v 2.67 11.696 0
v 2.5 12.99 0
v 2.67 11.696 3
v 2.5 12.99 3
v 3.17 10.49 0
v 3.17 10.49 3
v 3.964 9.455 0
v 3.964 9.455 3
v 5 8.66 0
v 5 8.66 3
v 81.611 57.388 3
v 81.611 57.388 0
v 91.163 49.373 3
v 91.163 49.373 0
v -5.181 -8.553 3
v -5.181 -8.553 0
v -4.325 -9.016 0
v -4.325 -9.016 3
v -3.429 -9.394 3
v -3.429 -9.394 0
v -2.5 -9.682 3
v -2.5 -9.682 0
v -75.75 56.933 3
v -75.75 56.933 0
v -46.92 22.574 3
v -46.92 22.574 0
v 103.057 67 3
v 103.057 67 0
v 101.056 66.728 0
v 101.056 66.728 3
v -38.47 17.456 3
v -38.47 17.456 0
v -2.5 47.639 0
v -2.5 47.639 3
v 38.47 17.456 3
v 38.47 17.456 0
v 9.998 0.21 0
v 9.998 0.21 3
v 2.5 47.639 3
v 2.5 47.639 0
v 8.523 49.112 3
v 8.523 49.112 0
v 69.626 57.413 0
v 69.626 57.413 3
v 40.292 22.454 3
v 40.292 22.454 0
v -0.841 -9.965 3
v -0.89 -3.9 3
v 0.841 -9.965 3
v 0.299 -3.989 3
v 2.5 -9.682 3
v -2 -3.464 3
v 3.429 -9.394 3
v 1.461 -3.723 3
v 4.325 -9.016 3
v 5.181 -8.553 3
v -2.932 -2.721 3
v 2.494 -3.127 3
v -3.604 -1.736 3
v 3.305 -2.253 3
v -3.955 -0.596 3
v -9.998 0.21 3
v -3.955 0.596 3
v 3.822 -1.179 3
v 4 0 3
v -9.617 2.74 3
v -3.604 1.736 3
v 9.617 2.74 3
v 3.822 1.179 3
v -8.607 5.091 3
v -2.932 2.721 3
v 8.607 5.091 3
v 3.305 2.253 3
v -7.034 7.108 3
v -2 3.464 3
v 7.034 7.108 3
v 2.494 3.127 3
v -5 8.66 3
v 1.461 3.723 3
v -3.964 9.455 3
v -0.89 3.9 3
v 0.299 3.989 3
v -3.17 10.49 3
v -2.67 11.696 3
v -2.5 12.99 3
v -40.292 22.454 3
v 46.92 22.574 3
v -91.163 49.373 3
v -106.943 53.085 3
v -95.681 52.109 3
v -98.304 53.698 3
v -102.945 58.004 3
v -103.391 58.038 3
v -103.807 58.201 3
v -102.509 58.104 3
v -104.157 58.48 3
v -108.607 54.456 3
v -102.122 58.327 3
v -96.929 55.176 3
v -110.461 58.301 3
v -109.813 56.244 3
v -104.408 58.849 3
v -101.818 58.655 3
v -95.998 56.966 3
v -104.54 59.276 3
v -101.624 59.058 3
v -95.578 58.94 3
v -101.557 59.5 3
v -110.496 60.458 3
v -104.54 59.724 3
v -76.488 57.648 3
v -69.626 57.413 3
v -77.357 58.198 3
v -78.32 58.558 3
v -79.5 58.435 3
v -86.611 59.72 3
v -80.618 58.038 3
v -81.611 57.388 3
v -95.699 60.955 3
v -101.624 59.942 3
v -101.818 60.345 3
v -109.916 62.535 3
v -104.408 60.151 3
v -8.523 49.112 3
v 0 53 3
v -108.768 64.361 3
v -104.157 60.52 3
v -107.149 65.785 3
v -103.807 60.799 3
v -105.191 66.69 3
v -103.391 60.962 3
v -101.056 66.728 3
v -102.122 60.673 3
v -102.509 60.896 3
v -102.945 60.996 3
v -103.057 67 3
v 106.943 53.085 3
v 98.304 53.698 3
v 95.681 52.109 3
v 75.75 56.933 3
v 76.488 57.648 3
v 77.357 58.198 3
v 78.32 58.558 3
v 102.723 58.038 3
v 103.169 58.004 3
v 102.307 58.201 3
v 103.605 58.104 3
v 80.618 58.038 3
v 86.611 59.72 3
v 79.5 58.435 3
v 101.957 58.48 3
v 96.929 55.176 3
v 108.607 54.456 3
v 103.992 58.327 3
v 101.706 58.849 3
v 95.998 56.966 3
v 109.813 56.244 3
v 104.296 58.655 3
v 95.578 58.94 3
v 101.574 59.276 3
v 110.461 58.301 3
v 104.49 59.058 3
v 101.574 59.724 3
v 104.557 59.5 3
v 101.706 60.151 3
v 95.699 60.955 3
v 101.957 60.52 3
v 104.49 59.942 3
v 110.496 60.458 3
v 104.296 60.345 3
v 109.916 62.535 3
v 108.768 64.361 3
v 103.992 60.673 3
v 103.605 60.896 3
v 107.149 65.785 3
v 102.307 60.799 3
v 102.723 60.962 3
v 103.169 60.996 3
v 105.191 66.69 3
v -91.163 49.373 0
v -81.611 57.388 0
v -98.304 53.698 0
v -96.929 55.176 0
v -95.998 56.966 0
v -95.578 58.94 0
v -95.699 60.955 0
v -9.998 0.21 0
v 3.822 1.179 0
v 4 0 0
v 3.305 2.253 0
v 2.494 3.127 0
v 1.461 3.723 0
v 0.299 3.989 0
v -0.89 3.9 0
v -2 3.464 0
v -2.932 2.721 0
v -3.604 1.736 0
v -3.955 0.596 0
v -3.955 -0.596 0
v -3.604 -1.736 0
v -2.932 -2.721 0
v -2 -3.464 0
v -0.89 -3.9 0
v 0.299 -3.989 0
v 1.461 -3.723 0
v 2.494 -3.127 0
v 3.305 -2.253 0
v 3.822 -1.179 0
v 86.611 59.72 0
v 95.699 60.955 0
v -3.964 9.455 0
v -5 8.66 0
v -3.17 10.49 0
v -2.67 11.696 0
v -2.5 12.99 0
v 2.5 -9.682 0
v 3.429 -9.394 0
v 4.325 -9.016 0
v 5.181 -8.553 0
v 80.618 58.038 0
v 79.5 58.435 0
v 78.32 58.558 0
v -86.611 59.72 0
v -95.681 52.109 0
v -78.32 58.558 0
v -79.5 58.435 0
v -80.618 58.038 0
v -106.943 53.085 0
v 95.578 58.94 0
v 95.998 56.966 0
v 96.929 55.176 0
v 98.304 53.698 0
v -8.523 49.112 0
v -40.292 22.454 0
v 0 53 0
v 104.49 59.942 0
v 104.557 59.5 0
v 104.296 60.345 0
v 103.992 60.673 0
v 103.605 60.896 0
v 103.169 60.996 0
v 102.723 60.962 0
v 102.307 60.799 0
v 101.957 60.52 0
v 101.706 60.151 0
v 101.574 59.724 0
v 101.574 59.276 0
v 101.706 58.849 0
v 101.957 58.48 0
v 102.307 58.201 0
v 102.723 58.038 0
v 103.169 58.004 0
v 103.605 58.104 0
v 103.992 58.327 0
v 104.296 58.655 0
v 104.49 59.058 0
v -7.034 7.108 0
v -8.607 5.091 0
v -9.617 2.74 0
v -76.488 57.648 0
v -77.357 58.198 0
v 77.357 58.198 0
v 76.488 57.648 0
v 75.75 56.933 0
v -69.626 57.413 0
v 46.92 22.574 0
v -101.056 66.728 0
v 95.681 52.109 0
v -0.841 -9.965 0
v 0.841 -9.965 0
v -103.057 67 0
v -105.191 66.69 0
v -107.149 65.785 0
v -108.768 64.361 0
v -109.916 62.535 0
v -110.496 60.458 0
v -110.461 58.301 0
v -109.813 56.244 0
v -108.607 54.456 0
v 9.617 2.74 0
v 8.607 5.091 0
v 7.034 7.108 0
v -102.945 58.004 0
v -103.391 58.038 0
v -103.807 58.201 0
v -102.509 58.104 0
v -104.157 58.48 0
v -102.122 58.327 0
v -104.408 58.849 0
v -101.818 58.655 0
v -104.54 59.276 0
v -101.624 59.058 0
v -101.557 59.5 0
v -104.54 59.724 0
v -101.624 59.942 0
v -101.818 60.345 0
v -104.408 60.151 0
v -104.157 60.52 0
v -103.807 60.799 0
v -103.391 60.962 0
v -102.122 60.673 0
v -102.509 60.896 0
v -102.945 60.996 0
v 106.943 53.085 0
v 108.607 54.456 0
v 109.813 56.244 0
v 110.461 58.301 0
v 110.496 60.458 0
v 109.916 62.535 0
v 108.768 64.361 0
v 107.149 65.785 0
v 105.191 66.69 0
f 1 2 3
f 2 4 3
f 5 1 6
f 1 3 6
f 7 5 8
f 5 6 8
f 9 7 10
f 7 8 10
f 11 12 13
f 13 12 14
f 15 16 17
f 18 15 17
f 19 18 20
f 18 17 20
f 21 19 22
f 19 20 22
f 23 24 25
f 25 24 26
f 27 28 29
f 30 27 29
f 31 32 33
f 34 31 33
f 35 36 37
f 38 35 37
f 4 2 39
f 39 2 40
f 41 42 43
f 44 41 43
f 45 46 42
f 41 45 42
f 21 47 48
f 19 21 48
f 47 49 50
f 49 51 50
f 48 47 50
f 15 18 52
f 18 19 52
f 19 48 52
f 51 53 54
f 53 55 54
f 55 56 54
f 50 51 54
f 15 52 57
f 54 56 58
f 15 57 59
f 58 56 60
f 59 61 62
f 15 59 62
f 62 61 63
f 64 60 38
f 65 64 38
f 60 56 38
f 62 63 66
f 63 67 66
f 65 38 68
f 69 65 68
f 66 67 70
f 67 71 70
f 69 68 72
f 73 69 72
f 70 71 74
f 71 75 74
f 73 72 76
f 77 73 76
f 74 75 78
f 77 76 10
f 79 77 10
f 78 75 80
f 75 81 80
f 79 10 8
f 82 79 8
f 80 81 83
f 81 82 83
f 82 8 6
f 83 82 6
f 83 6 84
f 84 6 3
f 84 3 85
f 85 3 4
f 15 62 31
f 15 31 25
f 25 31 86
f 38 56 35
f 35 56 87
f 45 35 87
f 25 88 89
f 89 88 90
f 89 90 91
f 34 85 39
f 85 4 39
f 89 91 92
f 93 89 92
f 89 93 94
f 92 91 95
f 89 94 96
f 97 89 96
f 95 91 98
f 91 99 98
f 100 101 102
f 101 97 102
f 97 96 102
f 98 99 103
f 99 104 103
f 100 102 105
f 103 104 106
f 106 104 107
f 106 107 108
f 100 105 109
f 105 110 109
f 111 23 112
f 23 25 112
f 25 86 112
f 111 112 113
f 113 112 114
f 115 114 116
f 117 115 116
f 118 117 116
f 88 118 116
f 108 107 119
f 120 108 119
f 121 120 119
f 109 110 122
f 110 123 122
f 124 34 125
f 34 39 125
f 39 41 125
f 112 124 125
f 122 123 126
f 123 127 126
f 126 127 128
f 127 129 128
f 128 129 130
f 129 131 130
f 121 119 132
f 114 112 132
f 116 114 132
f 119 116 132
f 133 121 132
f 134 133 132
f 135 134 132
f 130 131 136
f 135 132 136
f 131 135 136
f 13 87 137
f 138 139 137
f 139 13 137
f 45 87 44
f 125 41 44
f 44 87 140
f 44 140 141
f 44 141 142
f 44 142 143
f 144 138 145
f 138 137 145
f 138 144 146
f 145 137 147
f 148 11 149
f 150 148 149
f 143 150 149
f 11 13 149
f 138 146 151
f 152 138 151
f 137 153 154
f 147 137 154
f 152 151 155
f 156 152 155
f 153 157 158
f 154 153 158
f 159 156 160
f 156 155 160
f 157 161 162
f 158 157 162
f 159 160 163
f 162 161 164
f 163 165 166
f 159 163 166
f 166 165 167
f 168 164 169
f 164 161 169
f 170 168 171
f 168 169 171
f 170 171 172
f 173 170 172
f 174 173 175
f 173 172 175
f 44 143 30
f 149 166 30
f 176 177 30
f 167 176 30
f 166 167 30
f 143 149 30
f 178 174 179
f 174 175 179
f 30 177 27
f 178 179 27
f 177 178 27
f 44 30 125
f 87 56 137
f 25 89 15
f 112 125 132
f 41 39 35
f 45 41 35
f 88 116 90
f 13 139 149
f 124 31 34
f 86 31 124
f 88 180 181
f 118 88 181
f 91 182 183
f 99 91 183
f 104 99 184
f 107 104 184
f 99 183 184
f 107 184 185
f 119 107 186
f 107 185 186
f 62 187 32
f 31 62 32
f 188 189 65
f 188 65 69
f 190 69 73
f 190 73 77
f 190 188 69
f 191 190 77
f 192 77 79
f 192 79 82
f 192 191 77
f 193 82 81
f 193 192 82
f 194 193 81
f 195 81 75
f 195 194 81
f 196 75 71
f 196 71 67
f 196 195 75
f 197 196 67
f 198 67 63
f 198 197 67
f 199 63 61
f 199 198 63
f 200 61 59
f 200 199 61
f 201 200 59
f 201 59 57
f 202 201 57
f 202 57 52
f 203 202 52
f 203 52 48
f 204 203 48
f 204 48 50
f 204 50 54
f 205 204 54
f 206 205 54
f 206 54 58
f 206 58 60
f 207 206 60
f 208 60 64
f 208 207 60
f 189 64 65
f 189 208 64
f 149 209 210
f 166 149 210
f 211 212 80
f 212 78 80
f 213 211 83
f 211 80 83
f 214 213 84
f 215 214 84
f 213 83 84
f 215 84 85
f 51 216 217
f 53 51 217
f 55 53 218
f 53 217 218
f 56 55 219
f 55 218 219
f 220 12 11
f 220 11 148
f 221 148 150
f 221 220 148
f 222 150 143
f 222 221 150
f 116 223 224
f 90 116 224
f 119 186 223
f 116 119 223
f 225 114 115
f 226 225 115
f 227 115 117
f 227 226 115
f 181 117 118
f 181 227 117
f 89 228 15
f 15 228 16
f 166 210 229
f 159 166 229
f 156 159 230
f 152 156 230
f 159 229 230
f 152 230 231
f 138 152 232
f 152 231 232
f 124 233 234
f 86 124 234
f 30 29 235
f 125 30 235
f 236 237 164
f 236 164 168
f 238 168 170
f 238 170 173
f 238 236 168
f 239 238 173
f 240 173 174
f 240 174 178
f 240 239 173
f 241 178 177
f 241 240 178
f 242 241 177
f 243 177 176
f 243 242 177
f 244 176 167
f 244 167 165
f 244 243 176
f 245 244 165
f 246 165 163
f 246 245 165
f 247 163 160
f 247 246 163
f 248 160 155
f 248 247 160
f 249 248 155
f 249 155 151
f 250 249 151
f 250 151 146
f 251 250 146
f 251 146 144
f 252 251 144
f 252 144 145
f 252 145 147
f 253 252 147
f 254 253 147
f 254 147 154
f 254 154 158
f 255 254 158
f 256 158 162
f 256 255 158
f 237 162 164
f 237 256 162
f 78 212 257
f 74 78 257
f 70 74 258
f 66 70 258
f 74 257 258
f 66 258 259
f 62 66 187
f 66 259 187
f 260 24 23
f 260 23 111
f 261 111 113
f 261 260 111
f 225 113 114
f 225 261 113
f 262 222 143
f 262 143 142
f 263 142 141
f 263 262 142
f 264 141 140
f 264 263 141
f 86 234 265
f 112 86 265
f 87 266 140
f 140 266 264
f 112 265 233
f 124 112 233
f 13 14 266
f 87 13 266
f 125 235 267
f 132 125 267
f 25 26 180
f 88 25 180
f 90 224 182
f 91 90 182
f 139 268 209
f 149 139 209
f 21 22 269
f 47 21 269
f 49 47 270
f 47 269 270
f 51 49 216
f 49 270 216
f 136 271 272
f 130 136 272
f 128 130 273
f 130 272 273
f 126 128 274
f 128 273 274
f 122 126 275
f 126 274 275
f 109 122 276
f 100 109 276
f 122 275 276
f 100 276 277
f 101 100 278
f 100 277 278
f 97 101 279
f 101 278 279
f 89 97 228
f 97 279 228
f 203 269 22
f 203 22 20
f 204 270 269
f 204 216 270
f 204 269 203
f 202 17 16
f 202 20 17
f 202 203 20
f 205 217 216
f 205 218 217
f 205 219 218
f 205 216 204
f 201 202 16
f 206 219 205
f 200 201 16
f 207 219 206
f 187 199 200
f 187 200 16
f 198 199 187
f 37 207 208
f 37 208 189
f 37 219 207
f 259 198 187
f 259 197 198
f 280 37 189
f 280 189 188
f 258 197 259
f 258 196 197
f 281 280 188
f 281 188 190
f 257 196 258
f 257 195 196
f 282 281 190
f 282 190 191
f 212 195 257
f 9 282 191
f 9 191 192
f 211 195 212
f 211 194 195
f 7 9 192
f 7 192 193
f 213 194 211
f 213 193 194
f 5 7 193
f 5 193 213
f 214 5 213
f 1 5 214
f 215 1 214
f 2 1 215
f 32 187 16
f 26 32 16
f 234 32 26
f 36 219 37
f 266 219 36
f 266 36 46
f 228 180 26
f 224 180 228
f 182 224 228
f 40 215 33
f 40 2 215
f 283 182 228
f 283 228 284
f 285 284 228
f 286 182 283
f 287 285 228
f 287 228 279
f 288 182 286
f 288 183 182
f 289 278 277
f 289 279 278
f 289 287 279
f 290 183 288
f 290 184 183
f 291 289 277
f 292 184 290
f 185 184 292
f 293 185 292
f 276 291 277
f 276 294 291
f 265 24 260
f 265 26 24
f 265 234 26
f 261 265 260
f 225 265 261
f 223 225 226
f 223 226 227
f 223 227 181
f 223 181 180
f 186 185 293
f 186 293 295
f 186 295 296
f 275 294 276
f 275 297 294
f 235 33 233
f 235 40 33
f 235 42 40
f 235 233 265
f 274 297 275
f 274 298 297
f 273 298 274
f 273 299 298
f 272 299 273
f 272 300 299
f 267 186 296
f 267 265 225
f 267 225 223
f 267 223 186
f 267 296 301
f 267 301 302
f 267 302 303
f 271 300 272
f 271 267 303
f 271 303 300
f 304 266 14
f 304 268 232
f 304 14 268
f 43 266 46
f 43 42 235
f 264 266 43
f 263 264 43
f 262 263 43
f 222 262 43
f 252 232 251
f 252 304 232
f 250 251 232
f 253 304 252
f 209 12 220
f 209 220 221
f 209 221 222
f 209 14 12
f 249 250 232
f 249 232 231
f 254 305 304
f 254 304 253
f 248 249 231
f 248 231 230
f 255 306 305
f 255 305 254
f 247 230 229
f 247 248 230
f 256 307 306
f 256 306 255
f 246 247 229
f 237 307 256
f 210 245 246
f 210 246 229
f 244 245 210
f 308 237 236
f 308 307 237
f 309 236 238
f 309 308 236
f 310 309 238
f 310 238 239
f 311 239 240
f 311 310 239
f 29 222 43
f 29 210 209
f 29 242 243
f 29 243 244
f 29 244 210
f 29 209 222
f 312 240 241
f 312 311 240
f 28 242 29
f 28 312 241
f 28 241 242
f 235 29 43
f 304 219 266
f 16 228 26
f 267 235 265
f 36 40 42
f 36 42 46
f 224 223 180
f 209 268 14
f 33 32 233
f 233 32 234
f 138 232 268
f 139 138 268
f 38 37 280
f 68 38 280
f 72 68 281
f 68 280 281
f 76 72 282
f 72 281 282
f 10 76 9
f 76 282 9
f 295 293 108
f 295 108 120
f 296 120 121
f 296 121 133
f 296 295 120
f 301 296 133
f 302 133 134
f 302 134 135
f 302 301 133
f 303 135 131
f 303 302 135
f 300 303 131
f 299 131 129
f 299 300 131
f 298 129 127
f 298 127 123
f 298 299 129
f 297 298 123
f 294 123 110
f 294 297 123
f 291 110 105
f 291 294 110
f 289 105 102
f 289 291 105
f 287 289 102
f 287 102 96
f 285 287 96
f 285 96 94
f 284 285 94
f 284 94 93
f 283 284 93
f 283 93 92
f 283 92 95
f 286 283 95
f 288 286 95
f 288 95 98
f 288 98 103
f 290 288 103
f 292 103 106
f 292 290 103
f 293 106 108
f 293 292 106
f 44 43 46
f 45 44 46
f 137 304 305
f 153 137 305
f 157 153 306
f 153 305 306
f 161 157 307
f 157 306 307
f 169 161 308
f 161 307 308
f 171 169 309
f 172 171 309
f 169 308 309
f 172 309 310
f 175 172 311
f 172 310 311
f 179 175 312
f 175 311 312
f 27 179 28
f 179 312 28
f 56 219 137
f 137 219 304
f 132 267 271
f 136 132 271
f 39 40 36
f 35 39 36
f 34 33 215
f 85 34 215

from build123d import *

# Parameters (mm, degrees)
SKETCH_1_R      = 4
SKETCH_1_R_2    = 1.5
EXTRUDE_1_DEPTH = 3
FILLET_1_R      = 5
FILLET_2_R      = 5
FILLET_3_R      = 5


with BuildPart() as part:
    # 草图1 → 凸台-拉伸1 (new body)
    with BuildSketch(Plane.XY):
        with BuildLine():
            Line((101.056239558, 66.72819932), (0, 53))
            Line((0, 53), (-101.056239558, 66.72819932))
            Line((-101.056239558, 66.72819932), (-103.05702305, 67))
            ThreePointArc((-103.05702305, 67), (-110.280675742, 61.517137029), (-106.942649005, 53.085024478))
            Line((-106.942649005, 53.085024478), (-5.180834606, -8.553300696))
            ThreePointArc((-5.180834606, -8.553300696), (-3.881694774, -9.215880082), (-2.5, -9.682458366))
            ThreePointArc((-2.5, -9.682458366), (0, -10), (2.5, -9.682458366))
            ThreePointArc((2.5, -9.682458366), (3.881694774, -9.215880082), (5.180834606, -8.553300696))
            Line((5.180834606, -8.553300696), (106.942649005, 53.085024478))
            ThreePointArc((106.942649005, 53.085024478), (110.280675742, 61.517137029), (103.05702305, 67))
            Line((103.05702305, 67), (101.056239558, 66.72819932))
        make_face()
        Circle(SKETCH_1_R, mode=Mode.SUBTRACT)
        with BuildLine():
            Line((-38.470197272, 17.456153435), (-2.5, 47.638732699))
            Line((-2.5, 47.638732699), (-2.5, 9.682458366))
            ThreePointArc((-2.5, 9.682458366), (-7.840929555, 6.206434058), (-9.997792991, 0.210084034))
            Line((-9.997792991, 0.210084034), (-38.470197272, 17.456153435))
        make_face(mode=Mode.SUBTRACT)
        with BuildLine():
            Line((38.470197272, 17.456153435), (9.997792991, 0.210084034))
            ThreePointArc((9.997792991, 0.210084034), (7.840929555, 6.206434058), (2.5, 9.682458366))
            Line((2.5, 9.682458366), (2.5, 47.638732699))
            Line((2.5, 47.638732699), (38.470197272, 17.456153435))
        make_face(mode=Mode.SUBTRACT)
        Polygon((-76.992375251, 58.413267417), (-46.919815599, 22.574186413), (-91.163166243, 49.372903102), (-79.915961764, 58.810428231), align=None, mode=Mode.SUBTRACT)
        Polygon((-69.625606174, 57.412513038), (-8.52297152, 49.111895964), (-40.292213402, 22.454336819), align=None, mode=Mode.SUBTRACT)
        with BuildLine():
            Line((-95.680736217, 52.109248249), (-98.304134778, 53.698271544))
            ThreePointArc((-98.304134778, 53.698271544), (-95.998027486, 56.966113336), (-95.699425849, 60.954566405))
            Line((-95.699425849, 60.954566405), (-86.610723734, 59.719892378))
            Line((-86.610723734, 59.719892378), (-95.680736217, 52.109248249))
        make_face(mode=Mode.SUBTRACT)
        with Locations((-103.05702305, 59.5)):
            Circle(SKETCH_1_R_2, mode=Mode.SUBTRACT)
        Polygon((40.292213402, 22.454336819), (8.52297152, 49.111895964), (69.625606174, 57.412513038), align=None, mode=Mode.SUBTRACT)
        Polygon((91.163166243, 49.372903102), (46.919815599, 22.574186413), (76.992375251, 58.413267417), (79.915961764, 58.810428231), align=None, mode=Mode.SUBTRACT)
        with BuildLine():
            Line((95.680736217, 52.109248249), (86.610723734, 59.719892378))
            Line((86.610723734, 59.719892378), (95.699425849, 60.954566405))
            ThreePointArc((95.699425849, 60.954566405), (95.998027486, 56.966113336), (98.304134778, 53.698271544))
            Line((98.304134778, 53.698271544), (95.680736217, 52.109248249))
        make_face(mode=Mode.SUBTRACT)
        with Locations((103.05702305, 59.5)):
            Circle(SKETCH_1_R_2, mode=Mode.SUBTRACT)
    extrude(amount=EXTRUDE_1_DEPTH)

    # 圆角1
    # the kernel refuses this fillet: 5 mm, written as the material it adds along each edge
    with BuildSketch(Plane(origin=(76.992375251, 58.413267417, 0), x_dir=(0.9908985592379703, 0.1346107176272178, 0), z_dir=(0, 0, 1))) as fillet_1_piece_1:
        with BuildLine():
            CenterArc((FILLET_1_R * 0.386508582556, -FILLET_1_R), FILLET_1_R, 90, 42.263889815)
            Line((-FILLET_1_R * 0.286037651021, -FILLET_1_R * 0.259944891443), (0, 0))
            Line((0, 0), (FILLET_1_R * 0.386508582556, 0))
        make_face()
    extrude(amount=3)
    with BuildSketch(Plane(origin=(79.915961764, 58.810428231, 0), x_dir=(0.7660444431189772, -0.6427876096865403, 0), z_dir=(0, 0, 1))) as fillet_1_piece_2:
        with BuildLine():
            CenterArc((FILLET_1_R * 0.442472138408, -FILLET_1_R), FILLET_1_R, 90, 47.736110185)
            Line((-FILLET_1_R * 0.297582970149, -FILLET_1_R * 0.327453766423), (0, 0))
            Line((0, 0), (FILLET_1_R * 0.442472138408, 0))
        make_face()
    extrude(amount=3)

    # 圆角2
    # the kernel refuses this fillet: 5 mm, written as the material it adds along each edge
    with BuildSketch(Plane(origin=(-79.915961764, 58.810428231, 0), x_dir=(0.9908985592379704, -0.13461071762721746, 0), z_dir=(0, 0, 1))) as fillet_2_piece_1:
        with BuildLine():
            CenterArc((FILLET_2_R * 0.442472138408, -FILLET_2_R), FILLET_2_R, 90, 47.736110185)
            Line((-FILLET_2_R * 0.297582970149, -FILLET_2_R * 0.327453766423), (0, 0))
            Line((0, 0), (FILLET_2_R * 0.442472138408, 0))
        make_face()
    extrude(amount=3)
    with BuildSketch(Plane(origin=(-76.992375251, 58.413267417, 0), x_dir=(0.642787609686538, -0.7660444431189791, 0), z_dir=(0, 0, 1))) as fillet_2_piece_2:
        with BuildLine():
            CenterArc((FILLET_2_R * 0.386508582556, -FILLET_2_R), FILLET_2_R, 90, 42.263889815)
            Line((-FILLET_2_R * 0.286037651021, -FILLET_2_R * 0.259944891443), (0, 0))
            Line((0, 0), (FILLET_2_R * 0.386508582556, 0))
        make_face()
    extrude(amount=3)

    # 圆角3
    fillet_3_edges = [part.edges().sort_by_distance(p)[0] for p in [
        (-2.5, 9.682458366, 1.5),
        (2.5, 9.682458366, 1.5),
    ]]
    fillet(fillet_3_edges, radius=FILLET_3_R)


solid = part.part
